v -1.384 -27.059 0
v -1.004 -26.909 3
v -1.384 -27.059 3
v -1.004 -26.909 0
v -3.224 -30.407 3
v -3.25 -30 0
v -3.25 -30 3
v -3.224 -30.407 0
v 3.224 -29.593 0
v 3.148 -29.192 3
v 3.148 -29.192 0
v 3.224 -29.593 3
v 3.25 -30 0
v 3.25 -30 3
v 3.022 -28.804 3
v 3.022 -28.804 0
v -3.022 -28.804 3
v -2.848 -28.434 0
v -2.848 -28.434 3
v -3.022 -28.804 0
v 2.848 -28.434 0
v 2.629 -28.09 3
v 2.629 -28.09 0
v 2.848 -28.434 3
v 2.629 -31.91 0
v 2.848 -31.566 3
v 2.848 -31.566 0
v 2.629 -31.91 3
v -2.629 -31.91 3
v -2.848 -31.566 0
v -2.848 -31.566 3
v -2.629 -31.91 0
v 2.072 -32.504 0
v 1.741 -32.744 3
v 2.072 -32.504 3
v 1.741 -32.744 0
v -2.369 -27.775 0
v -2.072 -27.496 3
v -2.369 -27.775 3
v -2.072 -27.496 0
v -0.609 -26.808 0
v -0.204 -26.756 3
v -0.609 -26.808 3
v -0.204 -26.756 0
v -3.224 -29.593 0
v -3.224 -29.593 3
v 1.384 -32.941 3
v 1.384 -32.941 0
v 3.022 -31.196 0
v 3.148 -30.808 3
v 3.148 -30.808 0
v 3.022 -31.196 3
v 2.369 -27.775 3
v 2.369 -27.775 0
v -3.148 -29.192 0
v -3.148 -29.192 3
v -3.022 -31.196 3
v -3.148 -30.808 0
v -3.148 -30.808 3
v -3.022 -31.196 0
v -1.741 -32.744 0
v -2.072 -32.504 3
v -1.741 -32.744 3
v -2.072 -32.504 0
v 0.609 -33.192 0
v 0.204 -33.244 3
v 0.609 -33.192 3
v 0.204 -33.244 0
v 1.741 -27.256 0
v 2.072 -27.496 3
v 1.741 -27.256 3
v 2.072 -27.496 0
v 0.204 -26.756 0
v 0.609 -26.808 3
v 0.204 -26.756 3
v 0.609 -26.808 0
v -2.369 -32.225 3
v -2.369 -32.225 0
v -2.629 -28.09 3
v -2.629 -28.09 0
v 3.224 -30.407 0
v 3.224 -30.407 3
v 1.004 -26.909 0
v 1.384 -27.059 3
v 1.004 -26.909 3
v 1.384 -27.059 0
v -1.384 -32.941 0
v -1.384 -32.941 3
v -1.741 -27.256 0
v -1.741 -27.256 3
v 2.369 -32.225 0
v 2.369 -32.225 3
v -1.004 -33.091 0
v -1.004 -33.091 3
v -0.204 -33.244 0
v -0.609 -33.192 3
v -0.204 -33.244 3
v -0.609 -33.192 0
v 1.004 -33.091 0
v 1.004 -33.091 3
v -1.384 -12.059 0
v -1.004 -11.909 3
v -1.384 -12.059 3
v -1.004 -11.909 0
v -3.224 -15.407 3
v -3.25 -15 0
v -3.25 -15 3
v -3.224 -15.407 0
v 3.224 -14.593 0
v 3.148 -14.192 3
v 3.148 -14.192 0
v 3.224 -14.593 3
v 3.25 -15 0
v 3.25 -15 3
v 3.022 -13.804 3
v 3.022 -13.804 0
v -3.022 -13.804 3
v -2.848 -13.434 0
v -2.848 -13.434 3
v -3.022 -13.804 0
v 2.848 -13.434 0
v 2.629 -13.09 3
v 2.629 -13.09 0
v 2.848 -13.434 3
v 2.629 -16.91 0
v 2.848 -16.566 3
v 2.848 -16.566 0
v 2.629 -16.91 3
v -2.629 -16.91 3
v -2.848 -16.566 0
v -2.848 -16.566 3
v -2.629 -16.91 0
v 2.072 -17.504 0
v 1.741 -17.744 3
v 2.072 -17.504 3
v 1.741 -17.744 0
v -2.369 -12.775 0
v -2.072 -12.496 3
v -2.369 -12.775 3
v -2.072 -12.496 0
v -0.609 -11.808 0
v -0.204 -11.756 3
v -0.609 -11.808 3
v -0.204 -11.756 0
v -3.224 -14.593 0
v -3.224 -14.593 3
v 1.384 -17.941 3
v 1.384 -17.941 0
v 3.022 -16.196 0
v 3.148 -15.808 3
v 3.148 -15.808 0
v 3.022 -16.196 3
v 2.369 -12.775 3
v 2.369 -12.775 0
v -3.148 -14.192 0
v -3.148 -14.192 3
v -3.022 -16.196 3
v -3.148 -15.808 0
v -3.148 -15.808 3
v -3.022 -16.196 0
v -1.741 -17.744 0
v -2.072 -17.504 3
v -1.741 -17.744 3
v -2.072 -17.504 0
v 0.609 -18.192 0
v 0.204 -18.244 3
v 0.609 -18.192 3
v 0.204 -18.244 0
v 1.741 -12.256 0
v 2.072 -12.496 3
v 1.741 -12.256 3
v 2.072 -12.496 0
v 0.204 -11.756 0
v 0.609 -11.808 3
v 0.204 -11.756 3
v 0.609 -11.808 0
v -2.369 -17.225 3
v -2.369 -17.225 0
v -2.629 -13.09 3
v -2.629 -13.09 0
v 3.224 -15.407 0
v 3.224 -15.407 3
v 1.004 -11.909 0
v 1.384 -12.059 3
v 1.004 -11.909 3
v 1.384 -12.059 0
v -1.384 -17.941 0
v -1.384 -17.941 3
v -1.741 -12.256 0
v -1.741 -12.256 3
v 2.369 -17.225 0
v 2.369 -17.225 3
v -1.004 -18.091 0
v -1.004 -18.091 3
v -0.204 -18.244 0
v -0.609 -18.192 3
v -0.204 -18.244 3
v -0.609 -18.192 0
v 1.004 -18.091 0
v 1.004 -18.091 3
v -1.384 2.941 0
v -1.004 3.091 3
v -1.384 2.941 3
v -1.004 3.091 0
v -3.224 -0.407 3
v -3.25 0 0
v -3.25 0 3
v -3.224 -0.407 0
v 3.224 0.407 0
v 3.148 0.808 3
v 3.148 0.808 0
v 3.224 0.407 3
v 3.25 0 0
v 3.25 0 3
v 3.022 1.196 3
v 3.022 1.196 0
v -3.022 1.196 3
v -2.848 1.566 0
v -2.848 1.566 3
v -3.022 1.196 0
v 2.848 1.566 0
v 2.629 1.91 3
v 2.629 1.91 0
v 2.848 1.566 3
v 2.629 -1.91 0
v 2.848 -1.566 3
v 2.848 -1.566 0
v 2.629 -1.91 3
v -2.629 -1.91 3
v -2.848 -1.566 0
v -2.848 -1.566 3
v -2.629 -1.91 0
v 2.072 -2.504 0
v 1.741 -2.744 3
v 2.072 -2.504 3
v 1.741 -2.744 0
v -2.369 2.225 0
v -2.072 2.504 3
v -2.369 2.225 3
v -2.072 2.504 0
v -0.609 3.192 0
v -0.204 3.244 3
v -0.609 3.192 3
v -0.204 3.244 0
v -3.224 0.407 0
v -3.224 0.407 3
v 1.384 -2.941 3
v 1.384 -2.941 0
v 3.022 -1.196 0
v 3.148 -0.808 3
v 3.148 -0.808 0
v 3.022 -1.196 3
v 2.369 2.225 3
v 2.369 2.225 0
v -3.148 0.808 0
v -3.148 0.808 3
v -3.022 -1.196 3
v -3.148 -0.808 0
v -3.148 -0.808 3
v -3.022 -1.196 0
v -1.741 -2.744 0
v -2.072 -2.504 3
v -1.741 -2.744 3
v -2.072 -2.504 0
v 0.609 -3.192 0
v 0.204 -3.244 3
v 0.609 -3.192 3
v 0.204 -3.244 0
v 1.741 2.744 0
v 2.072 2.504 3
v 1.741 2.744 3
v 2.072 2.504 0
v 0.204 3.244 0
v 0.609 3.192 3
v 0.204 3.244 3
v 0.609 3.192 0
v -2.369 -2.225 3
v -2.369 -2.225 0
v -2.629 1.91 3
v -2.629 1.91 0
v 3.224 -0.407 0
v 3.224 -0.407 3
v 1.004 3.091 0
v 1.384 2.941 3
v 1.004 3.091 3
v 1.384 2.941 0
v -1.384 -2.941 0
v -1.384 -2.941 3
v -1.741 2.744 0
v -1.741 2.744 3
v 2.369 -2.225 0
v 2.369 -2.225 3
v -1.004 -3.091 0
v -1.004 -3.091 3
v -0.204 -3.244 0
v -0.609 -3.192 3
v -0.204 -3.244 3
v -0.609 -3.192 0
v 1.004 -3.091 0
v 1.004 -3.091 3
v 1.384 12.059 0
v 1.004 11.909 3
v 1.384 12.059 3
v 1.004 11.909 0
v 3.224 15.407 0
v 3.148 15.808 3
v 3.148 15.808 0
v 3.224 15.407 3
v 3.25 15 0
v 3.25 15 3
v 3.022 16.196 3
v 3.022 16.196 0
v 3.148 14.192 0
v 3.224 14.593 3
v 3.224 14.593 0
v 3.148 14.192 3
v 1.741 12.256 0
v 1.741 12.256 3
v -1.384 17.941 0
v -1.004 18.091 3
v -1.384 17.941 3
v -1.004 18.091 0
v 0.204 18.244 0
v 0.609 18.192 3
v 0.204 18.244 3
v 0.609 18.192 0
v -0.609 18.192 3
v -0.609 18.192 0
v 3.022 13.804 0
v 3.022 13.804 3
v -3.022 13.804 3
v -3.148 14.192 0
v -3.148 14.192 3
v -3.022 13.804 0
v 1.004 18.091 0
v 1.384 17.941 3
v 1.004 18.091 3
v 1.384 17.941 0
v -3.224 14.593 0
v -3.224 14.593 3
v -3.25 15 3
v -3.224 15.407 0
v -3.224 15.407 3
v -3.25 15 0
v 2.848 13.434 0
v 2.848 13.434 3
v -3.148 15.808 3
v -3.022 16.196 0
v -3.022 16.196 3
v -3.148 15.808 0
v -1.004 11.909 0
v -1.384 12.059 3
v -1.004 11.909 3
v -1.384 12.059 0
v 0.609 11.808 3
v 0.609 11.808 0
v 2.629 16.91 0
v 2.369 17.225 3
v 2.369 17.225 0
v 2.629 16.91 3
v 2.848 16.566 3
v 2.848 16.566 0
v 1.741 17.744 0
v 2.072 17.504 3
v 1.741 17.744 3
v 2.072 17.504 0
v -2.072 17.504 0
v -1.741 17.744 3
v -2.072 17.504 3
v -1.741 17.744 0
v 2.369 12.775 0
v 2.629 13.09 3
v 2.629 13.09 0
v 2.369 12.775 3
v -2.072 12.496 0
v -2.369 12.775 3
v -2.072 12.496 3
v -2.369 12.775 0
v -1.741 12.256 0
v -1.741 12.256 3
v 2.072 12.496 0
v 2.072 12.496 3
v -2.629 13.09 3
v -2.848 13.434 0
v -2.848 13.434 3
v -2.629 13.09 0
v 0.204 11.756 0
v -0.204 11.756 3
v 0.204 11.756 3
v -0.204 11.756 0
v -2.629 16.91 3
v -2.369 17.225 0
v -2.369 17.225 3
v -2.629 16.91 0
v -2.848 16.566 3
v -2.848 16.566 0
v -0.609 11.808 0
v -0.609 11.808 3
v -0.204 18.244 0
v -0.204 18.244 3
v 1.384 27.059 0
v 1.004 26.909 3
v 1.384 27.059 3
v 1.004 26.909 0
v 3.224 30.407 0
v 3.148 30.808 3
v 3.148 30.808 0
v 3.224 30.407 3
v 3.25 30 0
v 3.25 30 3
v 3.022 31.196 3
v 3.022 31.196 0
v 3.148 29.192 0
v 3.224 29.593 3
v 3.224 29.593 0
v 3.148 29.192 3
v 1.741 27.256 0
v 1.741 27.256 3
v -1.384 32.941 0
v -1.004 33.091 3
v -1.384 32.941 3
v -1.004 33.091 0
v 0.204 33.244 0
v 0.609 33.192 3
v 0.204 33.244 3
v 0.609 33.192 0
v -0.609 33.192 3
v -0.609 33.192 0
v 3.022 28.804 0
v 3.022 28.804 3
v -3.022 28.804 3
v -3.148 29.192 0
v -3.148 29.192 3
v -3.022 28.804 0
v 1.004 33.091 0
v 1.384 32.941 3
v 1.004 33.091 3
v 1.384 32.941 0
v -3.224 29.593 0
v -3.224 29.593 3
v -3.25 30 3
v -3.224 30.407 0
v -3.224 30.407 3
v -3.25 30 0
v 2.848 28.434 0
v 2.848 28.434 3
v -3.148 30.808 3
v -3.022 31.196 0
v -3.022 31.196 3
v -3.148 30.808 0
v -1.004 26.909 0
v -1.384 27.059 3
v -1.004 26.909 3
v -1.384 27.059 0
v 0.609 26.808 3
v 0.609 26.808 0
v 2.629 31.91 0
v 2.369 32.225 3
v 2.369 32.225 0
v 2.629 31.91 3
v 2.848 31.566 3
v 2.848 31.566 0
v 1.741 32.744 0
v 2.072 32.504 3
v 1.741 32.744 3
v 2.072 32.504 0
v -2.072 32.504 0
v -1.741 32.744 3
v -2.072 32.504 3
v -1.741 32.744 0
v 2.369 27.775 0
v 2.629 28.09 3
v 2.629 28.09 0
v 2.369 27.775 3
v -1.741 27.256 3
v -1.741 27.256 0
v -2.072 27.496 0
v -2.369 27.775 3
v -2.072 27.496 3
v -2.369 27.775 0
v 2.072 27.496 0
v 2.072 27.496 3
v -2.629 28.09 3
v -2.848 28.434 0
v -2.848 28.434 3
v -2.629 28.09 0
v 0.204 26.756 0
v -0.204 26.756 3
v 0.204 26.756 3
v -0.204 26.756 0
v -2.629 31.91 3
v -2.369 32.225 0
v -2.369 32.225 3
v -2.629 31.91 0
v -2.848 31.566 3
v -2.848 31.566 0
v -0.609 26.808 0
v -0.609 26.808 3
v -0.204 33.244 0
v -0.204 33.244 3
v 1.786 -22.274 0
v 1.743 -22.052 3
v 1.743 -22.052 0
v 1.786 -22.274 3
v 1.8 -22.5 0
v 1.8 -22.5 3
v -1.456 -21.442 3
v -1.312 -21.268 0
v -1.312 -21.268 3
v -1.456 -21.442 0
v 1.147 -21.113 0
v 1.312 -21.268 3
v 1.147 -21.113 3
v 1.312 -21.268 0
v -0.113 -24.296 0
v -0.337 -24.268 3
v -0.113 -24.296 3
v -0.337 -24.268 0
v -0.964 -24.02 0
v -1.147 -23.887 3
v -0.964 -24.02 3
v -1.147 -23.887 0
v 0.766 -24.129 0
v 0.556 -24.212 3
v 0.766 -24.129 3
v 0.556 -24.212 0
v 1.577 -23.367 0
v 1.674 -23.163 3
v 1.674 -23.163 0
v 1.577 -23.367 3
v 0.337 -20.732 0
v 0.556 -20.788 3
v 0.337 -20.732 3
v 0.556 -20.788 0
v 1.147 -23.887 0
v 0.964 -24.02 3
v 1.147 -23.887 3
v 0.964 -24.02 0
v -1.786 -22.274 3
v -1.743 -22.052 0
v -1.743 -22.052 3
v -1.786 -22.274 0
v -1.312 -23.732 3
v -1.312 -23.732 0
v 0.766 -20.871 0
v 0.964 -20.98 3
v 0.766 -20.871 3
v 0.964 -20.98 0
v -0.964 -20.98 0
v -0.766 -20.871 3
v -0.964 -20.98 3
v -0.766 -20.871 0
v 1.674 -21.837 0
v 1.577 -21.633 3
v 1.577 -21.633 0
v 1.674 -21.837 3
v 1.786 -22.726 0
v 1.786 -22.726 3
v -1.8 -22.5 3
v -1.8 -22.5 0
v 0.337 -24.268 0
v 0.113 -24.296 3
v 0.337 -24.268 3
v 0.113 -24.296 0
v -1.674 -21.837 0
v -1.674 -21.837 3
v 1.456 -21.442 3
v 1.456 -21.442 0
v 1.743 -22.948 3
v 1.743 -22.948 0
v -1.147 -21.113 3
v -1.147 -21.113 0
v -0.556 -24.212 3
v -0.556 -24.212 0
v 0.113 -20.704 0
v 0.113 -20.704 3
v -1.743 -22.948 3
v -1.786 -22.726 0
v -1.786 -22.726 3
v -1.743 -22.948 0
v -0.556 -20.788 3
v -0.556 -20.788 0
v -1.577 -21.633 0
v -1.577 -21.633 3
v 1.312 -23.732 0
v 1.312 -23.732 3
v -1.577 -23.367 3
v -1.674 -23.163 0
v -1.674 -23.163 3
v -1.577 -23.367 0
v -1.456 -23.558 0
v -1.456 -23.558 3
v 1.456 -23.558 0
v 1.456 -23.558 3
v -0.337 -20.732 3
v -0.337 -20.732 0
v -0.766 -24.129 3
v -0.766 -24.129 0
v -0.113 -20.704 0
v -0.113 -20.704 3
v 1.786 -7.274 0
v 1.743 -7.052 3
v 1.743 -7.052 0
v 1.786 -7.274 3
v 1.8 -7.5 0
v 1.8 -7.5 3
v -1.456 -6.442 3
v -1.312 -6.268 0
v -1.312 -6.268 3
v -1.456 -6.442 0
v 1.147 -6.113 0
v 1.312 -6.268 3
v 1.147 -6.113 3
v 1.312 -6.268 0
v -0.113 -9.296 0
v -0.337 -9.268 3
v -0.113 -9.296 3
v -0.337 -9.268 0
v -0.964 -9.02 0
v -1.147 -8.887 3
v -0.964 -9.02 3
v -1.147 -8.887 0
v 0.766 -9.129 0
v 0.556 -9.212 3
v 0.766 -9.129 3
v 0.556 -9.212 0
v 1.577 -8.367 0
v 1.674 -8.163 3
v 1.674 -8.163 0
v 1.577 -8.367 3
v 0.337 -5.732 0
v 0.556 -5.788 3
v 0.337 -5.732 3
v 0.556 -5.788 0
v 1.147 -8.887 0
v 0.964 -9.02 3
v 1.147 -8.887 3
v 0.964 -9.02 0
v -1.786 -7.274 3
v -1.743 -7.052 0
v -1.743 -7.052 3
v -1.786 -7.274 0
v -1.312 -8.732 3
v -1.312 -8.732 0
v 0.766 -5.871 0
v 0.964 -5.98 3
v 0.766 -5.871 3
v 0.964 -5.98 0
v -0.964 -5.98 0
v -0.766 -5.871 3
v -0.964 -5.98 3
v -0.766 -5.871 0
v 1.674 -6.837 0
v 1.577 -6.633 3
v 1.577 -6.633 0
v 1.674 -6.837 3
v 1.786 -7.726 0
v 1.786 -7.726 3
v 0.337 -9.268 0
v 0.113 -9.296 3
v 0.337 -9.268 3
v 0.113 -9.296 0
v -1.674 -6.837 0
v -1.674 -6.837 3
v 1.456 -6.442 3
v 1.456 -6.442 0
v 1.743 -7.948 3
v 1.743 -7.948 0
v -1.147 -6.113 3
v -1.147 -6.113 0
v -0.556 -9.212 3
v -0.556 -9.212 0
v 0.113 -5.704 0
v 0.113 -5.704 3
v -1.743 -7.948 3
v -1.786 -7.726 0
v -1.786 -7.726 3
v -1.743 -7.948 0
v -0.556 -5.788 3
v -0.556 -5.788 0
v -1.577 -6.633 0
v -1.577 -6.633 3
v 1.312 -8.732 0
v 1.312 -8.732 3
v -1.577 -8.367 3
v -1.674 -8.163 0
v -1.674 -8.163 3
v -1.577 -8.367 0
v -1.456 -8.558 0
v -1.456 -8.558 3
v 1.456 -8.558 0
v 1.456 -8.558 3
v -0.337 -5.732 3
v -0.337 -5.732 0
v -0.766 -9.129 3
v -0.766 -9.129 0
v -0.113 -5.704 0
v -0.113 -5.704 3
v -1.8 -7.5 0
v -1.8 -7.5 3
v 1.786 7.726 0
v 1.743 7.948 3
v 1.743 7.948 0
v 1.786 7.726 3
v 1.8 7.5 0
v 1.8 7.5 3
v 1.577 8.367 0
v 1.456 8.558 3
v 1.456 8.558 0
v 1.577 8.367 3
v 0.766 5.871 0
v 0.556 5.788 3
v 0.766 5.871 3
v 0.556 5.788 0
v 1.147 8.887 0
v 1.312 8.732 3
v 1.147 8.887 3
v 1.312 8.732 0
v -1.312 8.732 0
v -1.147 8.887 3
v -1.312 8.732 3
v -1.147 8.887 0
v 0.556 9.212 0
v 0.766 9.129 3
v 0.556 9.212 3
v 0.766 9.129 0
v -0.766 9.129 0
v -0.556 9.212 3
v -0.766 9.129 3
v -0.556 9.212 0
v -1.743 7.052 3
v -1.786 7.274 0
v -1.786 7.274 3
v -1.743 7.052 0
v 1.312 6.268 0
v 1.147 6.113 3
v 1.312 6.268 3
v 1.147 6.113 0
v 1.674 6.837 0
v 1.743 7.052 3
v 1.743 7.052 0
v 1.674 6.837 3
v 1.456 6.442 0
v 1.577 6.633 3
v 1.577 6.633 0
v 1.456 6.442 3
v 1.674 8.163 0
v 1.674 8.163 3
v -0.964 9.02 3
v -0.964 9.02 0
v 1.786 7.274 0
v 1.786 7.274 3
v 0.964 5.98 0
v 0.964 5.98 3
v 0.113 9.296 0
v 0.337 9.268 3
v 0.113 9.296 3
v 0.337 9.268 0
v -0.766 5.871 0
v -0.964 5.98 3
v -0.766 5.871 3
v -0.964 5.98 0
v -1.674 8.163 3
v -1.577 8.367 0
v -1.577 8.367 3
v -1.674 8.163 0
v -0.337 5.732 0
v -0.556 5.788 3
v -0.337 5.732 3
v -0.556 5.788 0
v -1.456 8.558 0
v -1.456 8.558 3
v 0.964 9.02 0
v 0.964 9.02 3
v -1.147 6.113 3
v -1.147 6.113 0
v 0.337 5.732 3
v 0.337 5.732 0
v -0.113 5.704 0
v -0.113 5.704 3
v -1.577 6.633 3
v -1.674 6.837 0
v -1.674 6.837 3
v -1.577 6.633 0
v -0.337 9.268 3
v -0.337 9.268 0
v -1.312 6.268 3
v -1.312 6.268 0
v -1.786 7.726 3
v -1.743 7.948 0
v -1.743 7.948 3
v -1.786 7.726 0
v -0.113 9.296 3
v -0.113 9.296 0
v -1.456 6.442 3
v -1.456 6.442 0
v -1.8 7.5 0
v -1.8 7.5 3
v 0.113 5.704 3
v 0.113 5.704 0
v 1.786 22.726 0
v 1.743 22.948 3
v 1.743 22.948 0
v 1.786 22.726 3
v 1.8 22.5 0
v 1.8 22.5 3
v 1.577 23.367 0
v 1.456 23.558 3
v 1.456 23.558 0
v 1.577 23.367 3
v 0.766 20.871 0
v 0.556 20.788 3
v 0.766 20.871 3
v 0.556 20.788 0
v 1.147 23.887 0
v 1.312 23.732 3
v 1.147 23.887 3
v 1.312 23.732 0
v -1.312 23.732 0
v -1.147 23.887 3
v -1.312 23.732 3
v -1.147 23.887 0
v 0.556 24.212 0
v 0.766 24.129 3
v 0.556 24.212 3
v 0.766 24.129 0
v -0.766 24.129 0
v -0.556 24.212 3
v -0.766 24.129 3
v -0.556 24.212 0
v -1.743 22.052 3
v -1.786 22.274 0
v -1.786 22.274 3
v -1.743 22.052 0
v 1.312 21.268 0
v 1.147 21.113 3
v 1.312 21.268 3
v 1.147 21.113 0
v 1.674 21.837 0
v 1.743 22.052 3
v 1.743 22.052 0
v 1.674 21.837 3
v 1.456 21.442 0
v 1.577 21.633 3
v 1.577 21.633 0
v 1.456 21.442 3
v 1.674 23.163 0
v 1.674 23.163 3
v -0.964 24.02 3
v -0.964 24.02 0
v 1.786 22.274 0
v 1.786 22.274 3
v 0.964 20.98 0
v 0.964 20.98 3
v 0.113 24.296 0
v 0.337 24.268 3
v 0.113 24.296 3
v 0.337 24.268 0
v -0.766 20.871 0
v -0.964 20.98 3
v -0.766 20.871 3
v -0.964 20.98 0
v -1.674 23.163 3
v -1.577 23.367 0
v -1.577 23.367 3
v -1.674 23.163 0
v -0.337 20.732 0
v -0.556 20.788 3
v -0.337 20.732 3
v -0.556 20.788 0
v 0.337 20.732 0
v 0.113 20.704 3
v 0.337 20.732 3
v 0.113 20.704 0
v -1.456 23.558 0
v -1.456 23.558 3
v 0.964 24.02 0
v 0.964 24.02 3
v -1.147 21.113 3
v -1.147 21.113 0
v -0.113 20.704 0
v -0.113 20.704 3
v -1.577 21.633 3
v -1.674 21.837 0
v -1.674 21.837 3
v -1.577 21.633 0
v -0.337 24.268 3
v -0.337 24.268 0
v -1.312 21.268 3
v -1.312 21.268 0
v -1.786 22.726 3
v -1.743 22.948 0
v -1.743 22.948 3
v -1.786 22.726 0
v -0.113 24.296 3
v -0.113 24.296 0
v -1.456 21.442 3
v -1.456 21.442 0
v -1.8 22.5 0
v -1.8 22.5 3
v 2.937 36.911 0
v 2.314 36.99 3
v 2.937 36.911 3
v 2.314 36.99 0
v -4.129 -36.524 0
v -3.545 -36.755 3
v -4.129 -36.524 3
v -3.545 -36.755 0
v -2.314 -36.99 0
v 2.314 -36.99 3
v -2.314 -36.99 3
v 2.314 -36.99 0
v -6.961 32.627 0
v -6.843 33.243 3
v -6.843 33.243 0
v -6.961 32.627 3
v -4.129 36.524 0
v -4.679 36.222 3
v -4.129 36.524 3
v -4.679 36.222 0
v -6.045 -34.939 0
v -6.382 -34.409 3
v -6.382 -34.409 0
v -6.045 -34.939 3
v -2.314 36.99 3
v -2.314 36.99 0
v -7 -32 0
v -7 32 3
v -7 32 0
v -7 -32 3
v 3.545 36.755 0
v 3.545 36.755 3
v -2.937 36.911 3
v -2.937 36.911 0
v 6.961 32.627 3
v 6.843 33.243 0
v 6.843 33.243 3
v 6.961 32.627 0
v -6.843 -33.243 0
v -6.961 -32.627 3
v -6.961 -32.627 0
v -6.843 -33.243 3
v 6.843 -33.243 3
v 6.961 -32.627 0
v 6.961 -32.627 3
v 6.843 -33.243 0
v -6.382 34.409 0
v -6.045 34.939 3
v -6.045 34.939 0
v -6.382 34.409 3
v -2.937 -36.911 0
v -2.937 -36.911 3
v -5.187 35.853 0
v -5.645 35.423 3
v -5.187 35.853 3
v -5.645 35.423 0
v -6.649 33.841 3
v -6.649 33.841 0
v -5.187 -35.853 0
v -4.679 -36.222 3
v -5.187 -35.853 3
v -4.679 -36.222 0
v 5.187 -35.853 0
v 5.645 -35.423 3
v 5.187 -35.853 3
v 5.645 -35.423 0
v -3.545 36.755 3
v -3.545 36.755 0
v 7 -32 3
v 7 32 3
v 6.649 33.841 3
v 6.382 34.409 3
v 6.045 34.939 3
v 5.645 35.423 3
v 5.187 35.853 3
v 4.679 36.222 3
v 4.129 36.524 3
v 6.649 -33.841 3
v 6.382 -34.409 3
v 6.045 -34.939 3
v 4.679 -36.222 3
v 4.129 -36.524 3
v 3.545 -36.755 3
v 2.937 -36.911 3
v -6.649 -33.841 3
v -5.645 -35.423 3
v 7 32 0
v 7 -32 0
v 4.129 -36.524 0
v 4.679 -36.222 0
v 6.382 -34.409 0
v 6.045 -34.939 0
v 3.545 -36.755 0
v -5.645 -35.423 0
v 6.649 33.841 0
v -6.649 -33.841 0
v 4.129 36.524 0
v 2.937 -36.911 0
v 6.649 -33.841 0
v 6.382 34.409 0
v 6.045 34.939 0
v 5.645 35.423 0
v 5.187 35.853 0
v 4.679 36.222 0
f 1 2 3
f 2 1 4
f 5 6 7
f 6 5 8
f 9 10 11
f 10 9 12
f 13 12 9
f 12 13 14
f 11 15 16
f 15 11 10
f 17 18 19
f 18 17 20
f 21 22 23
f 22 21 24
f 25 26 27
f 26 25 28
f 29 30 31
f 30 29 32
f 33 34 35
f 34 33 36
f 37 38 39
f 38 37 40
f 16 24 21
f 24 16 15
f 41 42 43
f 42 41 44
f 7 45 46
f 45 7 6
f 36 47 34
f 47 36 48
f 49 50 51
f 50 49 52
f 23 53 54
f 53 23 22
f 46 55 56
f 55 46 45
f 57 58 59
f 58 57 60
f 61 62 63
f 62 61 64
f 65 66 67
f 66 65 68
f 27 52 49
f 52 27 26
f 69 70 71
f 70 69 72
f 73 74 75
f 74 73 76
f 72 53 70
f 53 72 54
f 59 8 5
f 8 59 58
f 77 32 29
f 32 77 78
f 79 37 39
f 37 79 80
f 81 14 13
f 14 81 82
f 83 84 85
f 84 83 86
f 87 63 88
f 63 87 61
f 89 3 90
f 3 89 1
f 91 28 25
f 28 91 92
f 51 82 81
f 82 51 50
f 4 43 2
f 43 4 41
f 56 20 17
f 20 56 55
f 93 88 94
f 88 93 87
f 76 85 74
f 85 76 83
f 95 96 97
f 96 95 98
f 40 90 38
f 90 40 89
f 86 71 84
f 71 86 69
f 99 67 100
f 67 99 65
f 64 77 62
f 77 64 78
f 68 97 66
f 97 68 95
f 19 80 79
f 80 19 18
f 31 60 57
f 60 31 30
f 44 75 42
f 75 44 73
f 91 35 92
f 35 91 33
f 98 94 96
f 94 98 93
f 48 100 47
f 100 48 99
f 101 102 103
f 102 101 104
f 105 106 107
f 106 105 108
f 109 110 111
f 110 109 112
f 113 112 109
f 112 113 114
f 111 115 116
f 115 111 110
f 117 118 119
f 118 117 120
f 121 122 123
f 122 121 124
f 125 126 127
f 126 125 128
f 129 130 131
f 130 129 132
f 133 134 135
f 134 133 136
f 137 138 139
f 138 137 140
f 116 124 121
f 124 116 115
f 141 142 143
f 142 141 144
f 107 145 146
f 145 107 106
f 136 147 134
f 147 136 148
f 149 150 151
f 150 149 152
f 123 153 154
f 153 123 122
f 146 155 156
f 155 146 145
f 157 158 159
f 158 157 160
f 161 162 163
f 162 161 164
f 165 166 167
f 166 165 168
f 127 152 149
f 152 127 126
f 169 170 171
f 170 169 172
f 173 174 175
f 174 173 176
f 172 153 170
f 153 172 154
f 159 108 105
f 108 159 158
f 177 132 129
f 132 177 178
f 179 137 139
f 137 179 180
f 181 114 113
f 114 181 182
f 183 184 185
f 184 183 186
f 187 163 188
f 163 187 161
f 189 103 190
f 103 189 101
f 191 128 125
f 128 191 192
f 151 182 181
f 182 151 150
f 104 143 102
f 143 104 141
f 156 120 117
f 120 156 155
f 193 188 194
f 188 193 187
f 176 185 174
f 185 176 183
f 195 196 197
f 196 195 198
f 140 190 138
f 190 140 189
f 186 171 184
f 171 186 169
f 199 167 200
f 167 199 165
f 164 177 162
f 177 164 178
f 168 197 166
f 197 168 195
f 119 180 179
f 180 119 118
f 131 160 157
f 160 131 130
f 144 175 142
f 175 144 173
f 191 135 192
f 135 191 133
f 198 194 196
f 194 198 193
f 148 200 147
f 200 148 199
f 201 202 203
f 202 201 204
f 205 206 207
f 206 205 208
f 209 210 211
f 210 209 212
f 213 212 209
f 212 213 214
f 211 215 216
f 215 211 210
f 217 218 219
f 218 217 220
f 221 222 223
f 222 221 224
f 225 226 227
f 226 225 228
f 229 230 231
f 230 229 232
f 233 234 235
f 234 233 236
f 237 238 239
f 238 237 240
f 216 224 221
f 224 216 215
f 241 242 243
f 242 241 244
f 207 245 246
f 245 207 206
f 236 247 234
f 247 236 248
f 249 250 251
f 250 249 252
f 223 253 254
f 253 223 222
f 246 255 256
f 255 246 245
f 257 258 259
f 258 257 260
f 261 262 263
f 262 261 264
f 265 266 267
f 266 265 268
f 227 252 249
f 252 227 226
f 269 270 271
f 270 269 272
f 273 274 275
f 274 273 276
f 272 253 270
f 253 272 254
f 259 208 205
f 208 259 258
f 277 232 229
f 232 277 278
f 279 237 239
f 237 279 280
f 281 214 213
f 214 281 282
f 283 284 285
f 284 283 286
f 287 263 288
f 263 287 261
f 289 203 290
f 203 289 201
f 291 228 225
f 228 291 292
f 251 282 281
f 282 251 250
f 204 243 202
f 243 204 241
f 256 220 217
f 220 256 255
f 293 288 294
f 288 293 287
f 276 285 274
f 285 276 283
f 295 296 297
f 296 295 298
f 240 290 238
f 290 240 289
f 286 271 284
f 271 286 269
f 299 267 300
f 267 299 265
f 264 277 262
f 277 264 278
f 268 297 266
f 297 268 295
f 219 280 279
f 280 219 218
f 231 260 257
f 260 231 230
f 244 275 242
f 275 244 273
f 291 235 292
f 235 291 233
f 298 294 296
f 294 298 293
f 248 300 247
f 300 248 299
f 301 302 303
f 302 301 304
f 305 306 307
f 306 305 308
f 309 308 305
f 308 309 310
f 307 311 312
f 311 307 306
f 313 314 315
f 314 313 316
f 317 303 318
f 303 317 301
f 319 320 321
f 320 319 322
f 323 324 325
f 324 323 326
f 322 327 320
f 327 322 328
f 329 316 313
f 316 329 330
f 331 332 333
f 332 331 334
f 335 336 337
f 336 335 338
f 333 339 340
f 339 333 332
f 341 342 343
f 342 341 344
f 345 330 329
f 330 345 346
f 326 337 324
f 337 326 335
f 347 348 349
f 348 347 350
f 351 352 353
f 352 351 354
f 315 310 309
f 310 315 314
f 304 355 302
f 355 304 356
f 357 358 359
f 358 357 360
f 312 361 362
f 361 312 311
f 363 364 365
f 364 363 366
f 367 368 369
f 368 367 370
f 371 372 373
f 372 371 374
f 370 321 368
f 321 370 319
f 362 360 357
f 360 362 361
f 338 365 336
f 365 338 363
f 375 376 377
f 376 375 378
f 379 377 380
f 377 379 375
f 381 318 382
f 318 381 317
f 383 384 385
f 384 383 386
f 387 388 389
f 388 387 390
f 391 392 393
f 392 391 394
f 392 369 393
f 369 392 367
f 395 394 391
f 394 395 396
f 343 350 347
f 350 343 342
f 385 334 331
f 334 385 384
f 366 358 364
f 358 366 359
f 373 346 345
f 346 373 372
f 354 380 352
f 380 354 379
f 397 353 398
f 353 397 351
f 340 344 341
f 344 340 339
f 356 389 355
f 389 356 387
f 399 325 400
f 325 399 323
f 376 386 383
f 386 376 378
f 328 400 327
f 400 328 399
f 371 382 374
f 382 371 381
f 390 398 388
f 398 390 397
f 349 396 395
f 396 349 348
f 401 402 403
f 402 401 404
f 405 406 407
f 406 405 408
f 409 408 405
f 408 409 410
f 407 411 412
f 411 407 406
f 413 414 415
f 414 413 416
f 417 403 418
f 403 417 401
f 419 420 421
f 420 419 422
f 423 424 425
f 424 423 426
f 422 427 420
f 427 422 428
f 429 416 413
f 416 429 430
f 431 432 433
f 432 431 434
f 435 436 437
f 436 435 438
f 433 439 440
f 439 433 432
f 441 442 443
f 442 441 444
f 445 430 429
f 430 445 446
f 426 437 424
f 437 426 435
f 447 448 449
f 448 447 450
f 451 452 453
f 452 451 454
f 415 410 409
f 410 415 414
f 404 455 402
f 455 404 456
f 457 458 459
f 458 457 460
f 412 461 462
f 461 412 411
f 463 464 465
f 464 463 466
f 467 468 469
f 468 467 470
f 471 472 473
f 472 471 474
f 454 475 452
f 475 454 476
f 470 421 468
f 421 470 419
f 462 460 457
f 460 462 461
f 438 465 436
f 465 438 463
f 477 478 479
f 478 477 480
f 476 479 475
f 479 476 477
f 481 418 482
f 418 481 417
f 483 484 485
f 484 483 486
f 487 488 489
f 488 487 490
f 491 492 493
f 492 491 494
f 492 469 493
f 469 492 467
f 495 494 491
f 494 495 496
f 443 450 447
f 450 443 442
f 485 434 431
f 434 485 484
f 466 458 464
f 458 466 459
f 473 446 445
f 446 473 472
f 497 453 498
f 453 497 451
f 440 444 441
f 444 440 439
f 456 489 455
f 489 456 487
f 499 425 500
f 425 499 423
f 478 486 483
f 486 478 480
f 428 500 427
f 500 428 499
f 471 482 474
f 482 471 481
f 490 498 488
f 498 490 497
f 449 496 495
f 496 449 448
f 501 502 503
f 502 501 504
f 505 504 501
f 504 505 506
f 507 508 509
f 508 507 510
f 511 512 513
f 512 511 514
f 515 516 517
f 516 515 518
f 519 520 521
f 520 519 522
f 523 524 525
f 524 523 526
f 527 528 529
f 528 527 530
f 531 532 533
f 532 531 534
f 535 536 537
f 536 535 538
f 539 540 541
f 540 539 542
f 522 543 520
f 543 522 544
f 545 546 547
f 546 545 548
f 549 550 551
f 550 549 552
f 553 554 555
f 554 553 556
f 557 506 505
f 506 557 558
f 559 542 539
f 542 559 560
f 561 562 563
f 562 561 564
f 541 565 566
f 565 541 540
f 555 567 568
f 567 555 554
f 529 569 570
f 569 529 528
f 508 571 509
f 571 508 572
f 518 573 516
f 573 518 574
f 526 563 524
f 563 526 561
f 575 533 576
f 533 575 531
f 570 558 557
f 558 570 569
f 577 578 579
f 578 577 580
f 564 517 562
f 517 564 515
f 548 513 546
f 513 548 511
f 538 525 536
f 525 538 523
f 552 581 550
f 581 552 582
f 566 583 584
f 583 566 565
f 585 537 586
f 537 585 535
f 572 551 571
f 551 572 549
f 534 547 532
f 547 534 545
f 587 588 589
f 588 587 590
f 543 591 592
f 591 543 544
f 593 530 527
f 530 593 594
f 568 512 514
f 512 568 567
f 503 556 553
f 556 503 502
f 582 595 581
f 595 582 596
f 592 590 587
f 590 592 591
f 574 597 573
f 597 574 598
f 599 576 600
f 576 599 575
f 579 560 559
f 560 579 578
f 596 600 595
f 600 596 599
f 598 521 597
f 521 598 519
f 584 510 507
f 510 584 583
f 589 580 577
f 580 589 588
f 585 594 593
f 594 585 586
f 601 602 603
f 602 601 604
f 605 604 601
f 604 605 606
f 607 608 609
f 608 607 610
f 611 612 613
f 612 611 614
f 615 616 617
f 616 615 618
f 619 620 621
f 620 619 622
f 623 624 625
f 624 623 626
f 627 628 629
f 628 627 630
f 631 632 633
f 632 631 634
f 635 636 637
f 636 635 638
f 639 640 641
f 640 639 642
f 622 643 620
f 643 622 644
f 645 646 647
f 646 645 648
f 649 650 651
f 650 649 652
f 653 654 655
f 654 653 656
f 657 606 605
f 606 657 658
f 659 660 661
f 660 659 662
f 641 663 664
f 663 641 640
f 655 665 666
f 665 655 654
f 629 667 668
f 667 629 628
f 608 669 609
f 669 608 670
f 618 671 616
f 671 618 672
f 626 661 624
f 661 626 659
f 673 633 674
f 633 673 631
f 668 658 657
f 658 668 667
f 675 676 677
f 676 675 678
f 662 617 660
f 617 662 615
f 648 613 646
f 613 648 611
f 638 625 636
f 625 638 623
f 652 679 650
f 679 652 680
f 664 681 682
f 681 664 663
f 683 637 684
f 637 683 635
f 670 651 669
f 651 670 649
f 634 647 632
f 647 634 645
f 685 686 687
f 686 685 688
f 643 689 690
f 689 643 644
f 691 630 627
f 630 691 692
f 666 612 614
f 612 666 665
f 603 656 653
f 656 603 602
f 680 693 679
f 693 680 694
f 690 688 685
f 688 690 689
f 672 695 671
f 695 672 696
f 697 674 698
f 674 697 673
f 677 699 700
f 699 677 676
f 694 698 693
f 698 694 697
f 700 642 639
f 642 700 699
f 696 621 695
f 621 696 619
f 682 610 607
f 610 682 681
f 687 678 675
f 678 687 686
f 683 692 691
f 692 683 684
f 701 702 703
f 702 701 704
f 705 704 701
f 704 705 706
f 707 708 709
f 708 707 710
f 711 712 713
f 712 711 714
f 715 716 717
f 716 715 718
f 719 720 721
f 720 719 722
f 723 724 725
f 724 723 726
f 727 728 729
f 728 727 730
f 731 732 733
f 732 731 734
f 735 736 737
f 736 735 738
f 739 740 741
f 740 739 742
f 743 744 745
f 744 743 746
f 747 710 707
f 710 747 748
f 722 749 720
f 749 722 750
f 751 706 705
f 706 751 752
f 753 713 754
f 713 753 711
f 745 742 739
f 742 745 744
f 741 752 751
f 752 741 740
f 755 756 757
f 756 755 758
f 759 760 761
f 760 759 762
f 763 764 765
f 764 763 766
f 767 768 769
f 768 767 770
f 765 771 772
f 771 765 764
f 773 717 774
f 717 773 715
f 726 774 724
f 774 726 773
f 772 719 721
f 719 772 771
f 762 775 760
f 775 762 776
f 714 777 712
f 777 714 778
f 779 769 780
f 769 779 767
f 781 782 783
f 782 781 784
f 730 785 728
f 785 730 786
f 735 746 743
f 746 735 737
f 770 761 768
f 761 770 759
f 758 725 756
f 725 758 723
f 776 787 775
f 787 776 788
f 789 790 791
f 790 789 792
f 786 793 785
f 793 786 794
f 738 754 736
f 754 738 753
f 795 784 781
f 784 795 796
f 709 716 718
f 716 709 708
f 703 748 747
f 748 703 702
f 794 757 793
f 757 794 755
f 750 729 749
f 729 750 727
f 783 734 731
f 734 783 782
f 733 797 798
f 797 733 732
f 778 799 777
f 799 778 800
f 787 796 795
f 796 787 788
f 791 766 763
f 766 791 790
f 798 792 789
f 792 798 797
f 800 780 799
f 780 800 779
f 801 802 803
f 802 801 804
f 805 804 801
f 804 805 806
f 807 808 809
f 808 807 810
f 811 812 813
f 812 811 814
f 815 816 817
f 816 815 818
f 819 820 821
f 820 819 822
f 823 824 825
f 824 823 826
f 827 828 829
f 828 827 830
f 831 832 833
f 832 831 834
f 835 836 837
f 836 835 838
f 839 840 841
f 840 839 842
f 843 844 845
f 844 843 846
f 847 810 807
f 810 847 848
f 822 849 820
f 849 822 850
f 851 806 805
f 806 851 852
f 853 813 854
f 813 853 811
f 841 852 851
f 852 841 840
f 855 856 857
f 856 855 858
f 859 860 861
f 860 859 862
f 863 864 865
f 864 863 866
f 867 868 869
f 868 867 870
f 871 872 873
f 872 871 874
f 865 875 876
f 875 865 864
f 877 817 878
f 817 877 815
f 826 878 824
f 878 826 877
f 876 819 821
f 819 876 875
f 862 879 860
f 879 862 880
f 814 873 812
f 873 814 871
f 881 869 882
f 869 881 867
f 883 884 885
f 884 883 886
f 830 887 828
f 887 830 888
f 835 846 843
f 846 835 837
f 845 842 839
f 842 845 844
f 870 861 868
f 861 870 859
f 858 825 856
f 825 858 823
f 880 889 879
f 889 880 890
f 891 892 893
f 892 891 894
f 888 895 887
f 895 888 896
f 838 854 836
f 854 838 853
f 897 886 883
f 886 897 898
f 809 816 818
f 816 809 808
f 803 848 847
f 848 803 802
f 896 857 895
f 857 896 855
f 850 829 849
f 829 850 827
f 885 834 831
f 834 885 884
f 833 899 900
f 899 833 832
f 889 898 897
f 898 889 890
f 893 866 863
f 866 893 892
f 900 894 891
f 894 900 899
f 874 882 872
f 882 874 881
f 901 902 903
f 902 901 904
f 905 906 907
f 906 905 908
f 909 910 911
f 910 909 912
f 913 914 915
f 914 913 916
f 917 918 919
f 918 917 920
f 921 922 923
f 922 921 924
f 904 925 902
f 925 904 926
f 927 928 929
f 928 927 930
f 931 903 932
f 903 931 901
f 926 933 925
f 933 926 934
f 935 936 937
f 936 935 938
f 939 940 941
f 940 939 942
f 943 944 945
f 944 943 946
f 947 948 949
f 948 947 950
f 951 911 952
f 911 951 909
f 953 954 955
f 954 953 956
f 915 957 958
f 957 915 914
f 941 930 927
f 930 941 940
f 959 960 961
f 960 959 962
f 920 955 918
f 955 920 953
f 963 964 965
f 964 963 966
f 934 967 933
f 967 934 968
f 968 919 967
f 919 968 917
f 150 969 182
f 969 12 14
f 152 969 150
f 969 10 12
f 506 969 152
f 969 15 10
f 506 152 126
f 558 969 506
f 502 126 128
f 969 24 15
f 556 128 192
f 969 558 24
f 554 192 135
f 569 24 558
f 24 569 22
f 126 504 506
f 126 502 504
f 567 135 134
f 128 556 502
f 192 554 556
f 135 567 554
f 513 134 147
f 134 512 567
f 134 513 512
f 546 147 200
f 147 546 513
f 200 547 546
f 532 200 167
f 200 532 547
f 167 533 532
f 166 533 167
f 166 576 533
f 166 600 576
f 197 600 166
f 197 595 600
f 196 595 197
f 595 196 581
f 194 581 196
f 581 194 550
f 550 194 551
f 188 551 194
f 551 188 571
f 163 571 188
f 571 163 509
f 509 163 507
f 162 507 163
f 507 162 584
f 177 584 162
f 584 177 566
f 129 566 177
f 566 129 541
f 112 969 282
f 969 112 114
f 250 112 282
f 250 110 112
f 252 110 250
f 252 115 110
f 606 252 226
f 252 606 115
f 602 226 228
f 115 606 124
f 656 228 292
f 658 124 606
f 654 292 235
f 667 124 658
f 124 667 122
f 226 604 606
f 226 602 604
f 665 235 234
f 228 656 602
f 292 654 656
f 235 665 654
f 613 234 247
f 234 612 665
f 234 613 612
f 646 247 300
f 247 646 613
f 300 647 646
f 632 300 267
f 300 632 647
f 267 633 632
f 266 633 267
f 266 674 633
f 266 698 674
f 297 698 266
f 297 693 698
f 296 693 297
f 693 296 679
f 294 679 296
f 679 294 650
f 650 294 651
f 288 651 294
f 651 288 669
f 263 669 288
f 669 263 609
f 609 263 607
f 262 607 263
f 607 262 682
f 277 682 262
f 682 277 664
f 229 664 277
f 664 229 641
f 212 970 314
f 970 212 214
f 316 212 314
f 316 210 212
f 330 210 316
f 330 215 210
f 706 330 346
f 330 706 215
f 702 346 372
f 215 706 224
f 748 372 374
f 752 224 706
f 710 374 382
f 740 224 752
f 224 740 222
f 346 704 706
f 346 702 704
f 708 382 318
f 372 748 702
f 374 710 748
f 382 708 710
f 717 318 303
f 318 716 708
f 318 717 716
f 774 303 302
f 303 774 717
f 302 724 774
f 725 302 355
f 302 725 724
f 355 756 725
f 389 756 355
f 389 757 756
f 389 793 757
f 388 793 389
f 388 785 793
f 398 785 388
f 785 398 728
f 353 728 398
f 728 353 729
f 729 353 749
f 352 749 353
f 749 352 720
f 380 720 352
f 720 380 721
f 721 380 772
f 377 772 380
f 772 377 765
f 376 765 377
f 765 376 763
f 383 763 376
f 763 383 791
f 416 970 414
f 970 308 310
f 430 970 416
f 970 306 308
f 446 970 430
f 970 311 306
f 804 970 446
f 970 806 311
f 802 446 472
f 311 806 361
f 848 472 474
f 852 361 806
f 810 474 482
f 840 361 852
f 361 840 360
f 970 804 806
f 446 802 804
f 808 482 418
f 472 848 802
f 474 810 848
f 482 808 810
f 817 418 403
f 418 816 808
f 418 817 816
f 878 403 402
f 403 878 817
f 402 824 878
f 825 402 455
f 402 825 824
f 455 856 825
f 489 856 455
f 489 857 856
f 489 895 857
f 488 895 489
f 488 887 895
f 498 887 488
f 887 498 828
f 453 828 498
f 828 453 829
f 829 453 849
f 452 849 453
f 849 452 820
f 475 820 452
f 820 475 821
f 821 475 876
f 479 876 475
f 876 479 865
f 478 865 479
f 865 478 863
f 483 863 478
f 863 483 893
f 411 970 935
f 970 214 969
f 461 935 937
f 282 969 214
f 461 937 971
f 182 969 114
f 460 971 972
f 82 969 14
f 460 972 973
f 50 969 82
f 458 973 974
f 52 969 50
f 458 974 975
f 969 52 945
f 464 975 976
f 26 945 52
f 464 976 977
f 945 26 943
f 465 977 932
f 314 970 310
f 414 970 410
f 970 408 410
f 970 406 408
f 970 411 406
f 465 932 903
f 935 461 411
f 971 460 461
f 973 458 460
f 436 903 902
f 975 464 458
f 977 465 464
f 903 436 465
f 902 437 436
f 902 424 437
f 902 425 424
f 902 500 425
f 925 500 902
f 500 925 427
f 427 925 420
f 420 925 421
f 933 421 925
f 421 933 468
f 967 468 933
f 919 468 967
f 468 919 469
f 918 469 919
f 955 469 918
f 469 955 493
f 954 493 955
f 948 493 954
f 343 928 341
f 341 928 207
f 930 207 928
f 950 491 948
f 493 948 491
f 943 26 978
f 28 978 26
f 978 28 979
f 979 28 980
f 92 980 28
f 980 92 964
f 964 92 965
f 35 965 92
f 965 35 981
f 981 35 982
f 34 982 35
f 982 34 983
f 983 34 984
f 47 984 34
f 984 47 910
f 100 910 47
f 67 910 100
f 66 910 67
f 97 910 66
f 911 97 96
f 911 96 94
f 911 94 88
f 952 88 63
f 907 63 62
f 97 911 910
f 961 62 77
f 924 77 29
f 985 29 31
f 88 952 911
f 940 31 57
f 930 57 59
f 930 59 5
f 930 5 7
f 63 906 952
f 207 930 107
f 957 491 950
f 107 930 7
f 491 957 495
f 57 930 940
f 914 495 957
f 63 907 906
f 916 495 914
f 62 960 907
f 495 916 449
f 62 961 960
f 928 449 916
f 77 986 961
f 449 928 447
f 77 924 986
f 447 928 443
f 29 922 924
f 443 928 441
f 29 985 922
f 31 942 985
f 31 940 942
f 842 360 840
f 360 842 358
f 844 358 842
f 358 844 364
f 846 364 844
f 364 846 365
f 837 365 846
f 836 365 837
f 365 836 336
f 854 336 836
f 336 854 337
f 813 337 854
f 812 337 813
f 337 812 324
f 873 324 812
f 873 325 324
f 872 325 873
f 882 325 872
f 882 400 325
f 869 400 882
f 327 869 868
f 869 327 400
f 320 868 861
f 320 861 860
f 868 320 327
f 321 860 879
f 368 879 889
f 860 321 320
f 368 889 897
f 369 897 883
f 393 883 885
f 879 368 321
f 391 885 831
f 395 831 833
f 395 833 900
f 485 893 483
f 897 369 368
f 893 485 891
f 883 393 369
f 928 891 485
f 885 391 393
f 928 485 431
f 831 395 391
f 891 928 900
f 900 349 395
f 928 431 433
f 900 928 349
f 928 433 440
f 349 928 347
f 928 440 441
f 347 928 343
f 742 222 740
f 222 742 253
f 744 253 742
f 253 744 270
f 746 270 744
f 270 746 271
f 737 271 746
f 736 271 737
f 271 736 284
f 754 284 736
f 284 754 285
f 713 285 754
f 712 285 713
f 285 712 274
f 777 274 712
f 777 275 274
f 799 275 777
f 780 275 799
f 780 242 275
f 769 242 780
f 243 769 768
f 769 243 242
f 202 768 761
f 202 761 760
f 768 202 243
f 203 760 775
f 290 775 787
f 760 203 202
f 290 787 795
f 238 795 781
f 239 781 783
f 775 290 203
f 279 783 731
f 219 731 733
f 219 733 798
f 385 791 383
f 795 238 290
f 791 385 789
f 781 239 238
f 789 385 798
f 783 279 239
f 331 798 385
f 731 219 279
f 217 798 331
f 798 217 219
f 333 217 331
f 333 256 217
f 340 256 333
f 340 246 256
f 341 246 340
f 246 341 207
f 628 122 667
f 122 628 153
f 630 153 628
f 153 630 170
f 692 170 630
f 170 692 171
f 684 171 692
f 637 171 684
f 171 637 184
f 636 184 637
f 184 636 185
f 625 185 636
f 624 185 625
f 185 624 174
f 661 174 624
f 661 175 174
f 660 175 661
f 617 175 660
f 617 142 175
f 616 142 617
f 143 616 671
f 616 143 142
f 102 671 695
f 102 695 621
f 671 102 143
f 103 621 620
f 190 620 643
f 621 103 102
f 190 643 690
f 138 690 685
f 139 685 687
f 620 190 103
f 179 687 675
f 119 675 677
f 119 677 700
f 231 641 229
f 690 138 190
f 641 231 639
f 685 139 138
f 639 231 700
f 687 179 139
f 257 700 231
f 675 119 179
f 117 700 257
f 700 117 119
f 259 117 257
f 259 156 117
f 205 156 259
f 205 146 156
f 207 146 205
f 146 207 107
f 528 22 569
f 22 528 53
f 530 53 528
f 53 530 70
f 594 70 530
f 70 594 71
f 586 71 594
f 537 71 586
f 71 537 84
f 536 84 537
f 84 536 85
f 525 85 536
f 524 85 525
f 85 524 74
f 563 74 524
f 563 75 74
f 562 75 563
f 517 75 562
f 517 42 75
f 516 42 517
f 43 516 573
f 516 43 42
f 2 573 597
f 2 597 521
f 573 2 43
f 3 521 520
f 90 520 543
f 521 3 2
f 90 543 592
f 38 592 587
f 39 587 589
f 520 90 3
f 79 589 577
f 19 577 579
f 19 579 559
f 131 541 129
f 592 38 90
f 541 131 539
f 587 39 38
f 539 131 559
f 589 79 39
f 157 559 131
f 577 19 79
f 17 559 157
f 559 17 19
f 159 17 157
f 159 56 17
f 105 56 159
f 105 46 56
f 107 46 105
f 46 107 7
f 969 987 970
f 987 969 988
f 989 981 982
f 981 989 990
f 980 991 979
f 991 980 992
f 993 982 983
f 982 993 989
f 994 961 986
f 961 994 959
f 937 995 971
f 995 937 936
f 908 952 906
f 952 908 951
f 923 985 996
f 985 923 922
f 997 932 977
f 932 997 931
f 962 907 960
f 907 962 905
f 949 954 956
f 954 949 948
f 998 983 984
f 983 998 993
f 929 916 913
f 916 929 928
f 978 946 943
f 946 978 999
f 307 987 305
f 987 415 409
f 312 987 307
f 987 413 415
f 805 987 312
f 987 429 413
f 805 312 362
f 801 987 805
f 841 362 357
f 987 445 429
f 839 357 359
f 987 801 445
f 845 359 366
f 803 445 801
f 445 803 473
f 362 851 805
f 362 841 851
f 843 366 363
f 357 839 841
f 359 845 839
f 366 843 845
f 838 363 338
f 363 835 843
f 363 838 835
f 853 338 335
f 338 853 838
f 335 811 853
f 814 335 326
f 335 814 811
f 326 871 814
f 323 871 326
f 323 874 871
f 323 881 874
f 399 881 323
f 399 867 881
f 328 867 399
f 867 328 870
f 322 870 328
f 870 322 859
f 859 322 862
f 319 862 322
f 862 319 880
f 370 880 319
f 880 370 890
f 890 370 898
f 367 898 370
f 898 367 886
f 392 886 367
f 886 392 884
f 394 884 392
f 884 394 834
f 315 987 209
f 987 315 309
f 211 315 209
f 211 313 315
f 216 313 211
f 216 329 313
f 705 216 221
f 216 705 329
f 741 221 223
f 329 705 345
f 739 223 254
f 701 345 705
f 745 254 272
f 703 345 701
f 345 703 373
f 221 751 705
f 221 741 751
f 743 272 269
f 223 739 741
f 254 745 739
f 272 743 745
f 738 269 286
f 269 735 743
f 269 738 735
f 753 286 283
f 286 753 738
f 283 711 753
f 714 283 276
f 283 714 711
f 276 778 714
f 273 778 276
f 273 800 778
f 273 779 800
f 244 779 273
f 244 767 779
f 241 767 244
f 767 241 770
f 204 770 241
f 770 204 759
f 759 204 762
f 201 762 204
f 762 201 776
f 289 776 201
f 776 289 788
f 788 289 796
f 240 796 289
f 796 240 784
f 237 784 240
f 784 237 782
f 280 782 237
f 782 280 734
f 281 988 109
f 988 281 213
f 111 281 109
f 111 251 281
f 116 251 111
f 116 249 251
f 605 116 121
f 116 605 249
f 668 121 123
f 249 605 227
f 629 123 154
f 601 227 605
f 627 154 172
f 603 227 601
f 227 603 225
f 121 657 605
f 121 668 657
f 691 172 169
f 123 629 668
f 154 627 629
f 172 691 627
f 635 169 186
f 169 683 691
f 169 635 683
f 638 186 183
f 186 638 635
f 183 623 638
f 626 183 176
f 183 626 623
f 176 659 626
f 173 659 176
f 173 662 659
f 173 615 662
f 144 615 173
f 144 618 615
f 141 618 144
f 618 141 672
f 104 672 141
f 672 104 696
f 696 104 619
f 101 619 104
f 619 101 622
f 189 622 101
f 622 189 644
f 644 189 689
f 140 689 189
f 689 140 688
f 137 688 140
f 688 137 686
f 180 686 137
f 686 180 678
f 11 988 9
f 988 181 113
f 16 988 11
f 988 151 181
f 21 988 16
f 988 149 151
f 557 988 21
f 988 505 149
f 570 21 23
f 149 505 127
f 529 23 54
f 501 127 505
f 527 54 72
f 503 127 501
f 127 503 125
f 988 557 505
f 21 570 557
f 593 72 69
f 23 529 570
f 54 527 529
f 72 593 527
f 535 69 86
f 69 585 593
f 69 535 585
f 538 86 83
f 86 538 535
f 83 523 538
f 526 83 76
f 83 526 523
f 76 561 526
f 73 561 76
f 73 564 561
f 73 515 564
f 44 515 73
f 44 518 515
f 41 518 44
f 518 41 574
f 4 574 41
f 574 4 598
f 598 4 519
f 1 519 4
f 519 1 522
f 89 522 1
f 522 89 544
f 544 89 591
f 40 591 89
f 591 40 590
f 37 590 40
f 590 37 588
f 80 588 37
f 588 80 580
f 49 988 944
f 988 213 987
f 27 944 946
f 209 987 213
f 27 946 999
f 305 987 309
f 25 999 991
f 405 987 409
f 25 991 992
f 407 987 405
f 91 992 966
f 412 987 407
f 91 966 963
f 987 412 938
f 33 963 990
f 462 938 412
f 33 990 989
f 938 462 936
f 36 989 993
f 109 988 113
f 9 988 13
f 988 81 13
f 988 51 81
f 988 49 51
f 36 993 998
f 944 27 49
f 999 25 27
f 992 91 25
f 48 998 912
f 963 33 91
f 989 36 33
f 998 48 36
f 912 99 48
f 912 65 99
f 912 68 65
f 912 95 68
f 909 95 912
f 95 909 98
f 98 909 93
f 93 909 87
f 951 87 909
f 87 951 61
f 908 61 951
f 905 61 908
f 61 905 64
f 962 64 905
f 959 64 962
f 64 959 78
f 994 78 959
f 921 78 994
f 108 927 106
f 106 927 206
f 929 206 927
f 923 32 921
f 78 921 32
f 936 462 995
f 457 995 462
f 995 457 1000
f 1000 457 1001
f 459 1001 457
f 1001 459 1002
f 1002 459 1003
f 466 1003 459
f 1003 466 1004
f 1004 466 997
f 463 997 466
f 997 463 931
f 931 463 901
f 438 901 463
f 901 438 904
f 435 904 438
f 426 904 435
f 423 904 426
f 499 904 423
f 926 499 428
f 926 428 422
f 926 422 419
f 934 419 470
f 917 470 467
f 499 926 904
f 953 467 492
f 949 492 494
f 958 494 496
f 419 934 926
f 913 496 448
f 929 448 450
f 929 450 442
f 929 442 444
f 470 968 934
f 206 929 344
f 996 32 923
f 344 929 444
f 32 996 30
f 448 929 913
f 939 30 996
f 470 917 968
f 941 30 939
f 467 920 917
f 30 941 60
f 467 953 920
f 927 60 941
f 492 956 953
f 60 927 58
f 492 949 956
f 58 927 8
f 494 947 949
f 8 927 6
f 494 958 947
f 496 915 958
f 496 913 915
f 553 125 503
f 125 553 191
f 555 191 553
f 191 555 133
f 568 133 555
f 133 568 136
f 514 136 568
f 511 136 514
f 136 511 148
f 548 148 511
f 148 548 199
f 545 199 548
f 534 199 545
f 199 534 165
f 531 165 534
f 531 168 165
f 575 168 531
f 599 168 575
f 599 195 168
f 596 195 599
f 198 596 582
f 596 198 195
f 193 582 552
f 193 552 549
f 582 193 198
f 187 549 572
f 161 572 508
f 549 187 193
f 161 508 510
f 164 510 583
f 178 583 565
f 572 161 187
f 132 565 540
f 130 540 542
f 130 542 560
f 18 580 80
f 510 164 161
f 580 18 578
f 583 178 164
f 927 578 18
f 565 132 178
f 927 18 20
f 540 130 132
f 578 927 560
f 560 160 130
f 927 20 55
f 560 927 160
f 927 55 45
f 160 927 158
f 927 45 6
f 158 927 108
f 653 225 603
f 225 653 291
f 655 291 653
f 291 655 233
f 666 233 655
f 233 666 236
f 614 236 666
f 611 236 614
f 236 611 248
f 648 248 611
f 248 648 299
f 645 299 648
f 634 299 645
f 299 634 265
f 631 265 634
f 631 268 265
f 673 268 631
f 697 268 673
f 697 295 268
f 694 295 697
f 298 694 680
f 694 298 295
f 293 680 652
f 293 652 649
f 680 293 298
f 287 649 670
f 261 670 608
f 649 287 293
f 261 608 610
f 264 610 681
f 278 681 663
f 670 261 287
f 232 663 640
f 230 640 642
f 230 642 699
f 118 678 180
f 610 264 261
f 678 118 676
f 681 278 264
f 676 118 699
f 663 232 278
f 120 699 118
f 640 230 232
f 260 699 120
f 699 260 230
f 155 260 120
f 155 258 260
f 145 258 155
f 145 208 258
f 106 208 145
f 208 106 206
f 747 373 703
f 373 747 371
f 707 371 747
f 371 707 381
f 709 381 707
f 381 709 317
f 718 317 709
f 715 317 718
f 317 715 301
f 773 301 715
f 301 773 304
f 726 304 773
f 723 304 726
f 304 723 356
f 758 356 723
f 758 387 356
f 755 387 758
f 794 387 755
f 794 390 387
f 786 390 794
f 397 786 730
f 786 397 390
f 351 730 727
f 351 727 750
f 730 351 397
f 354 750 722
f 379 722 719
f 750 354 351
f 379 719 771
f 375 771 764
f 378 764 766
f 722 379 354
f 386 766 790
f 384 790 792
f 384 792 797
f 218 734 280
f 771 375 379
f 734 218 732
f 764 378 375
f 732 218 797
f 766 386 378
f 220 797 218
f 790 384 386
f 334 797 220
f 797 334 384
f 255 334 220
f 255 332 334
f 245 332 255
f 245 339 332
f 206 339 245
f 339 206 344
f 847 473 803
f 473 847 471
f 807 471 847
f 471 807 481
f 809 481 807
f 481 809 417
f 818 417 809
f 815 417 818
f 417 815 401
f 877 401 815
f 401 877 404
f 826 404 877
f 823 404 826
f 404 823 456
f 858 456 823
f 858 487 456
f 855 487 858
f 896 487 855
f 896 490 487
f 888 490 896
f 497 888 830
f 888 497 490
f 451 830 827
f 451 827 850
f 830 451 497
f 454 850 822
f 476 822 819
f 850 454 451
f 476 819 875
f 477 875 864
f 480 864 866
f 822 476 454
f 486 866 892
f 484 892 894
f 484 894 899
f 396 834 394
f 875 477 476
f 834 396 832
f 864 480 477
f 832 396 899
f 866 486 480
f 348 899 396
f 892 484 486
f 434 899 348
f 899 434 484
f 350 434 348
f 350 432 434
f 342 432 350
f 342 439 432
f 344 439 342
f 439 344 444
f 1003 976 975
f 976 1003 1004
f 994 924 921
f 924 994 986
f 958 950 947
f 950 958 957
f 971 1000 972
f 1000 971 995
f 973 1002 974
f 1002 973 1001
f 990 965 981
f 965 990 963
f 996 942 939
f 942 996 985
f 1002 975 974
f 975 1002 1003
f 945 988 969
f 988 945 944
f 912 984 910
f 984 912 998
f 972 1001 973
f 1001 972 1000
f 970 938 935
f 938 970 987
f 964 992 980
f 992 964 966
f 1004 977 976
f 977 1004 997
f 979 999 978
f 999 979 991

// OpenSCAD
$fn = 50;

difference() {
	union() {
		hull() {
			translate(v = [-2.0, 32.0, 0]) {
				cylinder(h = 3, r = 5);
			}
			translate(v = [2.0, 32.0, 0]) {
				cylinder(h = 3, r = 5);
			}
			translate(v = [-2.0, -32.0, 0]) {
				cylinder(h = 3, r = 5);
			}
			translate(v = [2.0, -32.0, 0]) {
				cylinder(h = 3, r = 5);
			}
		}
	}
	union() {
		translate(v = [0.0, -30.0, 0]) {
			translate(v = [0, 0, -100]) {
				cylinder(h = 200, r = 3.25);
			}
		}
		translate(v = [0.0, -15.0, 0]) {
			translate(v = [0, 0, -100]) {
				cylinder(h = 200, r = 3.25);
			}
		}
		translate(v = [0, 0, -100]) {
			cylinder(h = 200, r = 3.25);
		}
		translate(v = [0.0, 15.0, 0]) {
			translate(v = [0, 0, -100]) {
				cylinder(h = 200, r = 3.25);
			}
		}
		translate(v = [0.0, 30.0, 0]) {
			translate(v = [0, 0, -100]) {
				cylinder(h = 200, r = 3.25);
			}
		}
		translate(v = [0.0, -30.0, 0]) {
			translate(v = [0, 0, -100]) {
				cylinder(h = 200, r = 1.8);
			}
		}
		translate(v = [0.0, -22.5, 0]) {
			translate(v = [0, 0, -100]) {
				cylinder(h = 200, r = 1.8);
			}
		}
		translate(v = [0.0, -15.0, 0]) {
			translate(v = [0, 0, -100]) {
				cylinder(h = 200, r = 1.8);
			}
		}
		translate(v = [0.0, -7.5, 0]) {
			translate(v = [0, 0, -100]) {
				cylinder(h = 200, r = 1.8);
			}
		}
		translate(v = [0, 0, -100]) {
			cylinder(h = 200, r = 1.8);
		}
		translate(v = [0.0, 7.5, 0]) {
			translate(v = [0, 0, -100]) {
				cylinder(h = 200, r = 1.8);
			}
		}
		translate(v = [0.0, 15.0, 0]) {
			translate(v = [0, 0, -100]) {
				cylinder(h = 200, r = 1.8);
			}
		}
		translate(v = [0.0, 22.5, 0]) {
			translate(v = [0, 0, -100]) {
				cylinder(h = 200, r = 1.8);
			}
		}
		translate(v = [0.0, 30.0, 0]) {
			translate(v = [0, 0, -100]) {
				cylinder(h = 200, r = 1.8);
			}
		}
	}
}
